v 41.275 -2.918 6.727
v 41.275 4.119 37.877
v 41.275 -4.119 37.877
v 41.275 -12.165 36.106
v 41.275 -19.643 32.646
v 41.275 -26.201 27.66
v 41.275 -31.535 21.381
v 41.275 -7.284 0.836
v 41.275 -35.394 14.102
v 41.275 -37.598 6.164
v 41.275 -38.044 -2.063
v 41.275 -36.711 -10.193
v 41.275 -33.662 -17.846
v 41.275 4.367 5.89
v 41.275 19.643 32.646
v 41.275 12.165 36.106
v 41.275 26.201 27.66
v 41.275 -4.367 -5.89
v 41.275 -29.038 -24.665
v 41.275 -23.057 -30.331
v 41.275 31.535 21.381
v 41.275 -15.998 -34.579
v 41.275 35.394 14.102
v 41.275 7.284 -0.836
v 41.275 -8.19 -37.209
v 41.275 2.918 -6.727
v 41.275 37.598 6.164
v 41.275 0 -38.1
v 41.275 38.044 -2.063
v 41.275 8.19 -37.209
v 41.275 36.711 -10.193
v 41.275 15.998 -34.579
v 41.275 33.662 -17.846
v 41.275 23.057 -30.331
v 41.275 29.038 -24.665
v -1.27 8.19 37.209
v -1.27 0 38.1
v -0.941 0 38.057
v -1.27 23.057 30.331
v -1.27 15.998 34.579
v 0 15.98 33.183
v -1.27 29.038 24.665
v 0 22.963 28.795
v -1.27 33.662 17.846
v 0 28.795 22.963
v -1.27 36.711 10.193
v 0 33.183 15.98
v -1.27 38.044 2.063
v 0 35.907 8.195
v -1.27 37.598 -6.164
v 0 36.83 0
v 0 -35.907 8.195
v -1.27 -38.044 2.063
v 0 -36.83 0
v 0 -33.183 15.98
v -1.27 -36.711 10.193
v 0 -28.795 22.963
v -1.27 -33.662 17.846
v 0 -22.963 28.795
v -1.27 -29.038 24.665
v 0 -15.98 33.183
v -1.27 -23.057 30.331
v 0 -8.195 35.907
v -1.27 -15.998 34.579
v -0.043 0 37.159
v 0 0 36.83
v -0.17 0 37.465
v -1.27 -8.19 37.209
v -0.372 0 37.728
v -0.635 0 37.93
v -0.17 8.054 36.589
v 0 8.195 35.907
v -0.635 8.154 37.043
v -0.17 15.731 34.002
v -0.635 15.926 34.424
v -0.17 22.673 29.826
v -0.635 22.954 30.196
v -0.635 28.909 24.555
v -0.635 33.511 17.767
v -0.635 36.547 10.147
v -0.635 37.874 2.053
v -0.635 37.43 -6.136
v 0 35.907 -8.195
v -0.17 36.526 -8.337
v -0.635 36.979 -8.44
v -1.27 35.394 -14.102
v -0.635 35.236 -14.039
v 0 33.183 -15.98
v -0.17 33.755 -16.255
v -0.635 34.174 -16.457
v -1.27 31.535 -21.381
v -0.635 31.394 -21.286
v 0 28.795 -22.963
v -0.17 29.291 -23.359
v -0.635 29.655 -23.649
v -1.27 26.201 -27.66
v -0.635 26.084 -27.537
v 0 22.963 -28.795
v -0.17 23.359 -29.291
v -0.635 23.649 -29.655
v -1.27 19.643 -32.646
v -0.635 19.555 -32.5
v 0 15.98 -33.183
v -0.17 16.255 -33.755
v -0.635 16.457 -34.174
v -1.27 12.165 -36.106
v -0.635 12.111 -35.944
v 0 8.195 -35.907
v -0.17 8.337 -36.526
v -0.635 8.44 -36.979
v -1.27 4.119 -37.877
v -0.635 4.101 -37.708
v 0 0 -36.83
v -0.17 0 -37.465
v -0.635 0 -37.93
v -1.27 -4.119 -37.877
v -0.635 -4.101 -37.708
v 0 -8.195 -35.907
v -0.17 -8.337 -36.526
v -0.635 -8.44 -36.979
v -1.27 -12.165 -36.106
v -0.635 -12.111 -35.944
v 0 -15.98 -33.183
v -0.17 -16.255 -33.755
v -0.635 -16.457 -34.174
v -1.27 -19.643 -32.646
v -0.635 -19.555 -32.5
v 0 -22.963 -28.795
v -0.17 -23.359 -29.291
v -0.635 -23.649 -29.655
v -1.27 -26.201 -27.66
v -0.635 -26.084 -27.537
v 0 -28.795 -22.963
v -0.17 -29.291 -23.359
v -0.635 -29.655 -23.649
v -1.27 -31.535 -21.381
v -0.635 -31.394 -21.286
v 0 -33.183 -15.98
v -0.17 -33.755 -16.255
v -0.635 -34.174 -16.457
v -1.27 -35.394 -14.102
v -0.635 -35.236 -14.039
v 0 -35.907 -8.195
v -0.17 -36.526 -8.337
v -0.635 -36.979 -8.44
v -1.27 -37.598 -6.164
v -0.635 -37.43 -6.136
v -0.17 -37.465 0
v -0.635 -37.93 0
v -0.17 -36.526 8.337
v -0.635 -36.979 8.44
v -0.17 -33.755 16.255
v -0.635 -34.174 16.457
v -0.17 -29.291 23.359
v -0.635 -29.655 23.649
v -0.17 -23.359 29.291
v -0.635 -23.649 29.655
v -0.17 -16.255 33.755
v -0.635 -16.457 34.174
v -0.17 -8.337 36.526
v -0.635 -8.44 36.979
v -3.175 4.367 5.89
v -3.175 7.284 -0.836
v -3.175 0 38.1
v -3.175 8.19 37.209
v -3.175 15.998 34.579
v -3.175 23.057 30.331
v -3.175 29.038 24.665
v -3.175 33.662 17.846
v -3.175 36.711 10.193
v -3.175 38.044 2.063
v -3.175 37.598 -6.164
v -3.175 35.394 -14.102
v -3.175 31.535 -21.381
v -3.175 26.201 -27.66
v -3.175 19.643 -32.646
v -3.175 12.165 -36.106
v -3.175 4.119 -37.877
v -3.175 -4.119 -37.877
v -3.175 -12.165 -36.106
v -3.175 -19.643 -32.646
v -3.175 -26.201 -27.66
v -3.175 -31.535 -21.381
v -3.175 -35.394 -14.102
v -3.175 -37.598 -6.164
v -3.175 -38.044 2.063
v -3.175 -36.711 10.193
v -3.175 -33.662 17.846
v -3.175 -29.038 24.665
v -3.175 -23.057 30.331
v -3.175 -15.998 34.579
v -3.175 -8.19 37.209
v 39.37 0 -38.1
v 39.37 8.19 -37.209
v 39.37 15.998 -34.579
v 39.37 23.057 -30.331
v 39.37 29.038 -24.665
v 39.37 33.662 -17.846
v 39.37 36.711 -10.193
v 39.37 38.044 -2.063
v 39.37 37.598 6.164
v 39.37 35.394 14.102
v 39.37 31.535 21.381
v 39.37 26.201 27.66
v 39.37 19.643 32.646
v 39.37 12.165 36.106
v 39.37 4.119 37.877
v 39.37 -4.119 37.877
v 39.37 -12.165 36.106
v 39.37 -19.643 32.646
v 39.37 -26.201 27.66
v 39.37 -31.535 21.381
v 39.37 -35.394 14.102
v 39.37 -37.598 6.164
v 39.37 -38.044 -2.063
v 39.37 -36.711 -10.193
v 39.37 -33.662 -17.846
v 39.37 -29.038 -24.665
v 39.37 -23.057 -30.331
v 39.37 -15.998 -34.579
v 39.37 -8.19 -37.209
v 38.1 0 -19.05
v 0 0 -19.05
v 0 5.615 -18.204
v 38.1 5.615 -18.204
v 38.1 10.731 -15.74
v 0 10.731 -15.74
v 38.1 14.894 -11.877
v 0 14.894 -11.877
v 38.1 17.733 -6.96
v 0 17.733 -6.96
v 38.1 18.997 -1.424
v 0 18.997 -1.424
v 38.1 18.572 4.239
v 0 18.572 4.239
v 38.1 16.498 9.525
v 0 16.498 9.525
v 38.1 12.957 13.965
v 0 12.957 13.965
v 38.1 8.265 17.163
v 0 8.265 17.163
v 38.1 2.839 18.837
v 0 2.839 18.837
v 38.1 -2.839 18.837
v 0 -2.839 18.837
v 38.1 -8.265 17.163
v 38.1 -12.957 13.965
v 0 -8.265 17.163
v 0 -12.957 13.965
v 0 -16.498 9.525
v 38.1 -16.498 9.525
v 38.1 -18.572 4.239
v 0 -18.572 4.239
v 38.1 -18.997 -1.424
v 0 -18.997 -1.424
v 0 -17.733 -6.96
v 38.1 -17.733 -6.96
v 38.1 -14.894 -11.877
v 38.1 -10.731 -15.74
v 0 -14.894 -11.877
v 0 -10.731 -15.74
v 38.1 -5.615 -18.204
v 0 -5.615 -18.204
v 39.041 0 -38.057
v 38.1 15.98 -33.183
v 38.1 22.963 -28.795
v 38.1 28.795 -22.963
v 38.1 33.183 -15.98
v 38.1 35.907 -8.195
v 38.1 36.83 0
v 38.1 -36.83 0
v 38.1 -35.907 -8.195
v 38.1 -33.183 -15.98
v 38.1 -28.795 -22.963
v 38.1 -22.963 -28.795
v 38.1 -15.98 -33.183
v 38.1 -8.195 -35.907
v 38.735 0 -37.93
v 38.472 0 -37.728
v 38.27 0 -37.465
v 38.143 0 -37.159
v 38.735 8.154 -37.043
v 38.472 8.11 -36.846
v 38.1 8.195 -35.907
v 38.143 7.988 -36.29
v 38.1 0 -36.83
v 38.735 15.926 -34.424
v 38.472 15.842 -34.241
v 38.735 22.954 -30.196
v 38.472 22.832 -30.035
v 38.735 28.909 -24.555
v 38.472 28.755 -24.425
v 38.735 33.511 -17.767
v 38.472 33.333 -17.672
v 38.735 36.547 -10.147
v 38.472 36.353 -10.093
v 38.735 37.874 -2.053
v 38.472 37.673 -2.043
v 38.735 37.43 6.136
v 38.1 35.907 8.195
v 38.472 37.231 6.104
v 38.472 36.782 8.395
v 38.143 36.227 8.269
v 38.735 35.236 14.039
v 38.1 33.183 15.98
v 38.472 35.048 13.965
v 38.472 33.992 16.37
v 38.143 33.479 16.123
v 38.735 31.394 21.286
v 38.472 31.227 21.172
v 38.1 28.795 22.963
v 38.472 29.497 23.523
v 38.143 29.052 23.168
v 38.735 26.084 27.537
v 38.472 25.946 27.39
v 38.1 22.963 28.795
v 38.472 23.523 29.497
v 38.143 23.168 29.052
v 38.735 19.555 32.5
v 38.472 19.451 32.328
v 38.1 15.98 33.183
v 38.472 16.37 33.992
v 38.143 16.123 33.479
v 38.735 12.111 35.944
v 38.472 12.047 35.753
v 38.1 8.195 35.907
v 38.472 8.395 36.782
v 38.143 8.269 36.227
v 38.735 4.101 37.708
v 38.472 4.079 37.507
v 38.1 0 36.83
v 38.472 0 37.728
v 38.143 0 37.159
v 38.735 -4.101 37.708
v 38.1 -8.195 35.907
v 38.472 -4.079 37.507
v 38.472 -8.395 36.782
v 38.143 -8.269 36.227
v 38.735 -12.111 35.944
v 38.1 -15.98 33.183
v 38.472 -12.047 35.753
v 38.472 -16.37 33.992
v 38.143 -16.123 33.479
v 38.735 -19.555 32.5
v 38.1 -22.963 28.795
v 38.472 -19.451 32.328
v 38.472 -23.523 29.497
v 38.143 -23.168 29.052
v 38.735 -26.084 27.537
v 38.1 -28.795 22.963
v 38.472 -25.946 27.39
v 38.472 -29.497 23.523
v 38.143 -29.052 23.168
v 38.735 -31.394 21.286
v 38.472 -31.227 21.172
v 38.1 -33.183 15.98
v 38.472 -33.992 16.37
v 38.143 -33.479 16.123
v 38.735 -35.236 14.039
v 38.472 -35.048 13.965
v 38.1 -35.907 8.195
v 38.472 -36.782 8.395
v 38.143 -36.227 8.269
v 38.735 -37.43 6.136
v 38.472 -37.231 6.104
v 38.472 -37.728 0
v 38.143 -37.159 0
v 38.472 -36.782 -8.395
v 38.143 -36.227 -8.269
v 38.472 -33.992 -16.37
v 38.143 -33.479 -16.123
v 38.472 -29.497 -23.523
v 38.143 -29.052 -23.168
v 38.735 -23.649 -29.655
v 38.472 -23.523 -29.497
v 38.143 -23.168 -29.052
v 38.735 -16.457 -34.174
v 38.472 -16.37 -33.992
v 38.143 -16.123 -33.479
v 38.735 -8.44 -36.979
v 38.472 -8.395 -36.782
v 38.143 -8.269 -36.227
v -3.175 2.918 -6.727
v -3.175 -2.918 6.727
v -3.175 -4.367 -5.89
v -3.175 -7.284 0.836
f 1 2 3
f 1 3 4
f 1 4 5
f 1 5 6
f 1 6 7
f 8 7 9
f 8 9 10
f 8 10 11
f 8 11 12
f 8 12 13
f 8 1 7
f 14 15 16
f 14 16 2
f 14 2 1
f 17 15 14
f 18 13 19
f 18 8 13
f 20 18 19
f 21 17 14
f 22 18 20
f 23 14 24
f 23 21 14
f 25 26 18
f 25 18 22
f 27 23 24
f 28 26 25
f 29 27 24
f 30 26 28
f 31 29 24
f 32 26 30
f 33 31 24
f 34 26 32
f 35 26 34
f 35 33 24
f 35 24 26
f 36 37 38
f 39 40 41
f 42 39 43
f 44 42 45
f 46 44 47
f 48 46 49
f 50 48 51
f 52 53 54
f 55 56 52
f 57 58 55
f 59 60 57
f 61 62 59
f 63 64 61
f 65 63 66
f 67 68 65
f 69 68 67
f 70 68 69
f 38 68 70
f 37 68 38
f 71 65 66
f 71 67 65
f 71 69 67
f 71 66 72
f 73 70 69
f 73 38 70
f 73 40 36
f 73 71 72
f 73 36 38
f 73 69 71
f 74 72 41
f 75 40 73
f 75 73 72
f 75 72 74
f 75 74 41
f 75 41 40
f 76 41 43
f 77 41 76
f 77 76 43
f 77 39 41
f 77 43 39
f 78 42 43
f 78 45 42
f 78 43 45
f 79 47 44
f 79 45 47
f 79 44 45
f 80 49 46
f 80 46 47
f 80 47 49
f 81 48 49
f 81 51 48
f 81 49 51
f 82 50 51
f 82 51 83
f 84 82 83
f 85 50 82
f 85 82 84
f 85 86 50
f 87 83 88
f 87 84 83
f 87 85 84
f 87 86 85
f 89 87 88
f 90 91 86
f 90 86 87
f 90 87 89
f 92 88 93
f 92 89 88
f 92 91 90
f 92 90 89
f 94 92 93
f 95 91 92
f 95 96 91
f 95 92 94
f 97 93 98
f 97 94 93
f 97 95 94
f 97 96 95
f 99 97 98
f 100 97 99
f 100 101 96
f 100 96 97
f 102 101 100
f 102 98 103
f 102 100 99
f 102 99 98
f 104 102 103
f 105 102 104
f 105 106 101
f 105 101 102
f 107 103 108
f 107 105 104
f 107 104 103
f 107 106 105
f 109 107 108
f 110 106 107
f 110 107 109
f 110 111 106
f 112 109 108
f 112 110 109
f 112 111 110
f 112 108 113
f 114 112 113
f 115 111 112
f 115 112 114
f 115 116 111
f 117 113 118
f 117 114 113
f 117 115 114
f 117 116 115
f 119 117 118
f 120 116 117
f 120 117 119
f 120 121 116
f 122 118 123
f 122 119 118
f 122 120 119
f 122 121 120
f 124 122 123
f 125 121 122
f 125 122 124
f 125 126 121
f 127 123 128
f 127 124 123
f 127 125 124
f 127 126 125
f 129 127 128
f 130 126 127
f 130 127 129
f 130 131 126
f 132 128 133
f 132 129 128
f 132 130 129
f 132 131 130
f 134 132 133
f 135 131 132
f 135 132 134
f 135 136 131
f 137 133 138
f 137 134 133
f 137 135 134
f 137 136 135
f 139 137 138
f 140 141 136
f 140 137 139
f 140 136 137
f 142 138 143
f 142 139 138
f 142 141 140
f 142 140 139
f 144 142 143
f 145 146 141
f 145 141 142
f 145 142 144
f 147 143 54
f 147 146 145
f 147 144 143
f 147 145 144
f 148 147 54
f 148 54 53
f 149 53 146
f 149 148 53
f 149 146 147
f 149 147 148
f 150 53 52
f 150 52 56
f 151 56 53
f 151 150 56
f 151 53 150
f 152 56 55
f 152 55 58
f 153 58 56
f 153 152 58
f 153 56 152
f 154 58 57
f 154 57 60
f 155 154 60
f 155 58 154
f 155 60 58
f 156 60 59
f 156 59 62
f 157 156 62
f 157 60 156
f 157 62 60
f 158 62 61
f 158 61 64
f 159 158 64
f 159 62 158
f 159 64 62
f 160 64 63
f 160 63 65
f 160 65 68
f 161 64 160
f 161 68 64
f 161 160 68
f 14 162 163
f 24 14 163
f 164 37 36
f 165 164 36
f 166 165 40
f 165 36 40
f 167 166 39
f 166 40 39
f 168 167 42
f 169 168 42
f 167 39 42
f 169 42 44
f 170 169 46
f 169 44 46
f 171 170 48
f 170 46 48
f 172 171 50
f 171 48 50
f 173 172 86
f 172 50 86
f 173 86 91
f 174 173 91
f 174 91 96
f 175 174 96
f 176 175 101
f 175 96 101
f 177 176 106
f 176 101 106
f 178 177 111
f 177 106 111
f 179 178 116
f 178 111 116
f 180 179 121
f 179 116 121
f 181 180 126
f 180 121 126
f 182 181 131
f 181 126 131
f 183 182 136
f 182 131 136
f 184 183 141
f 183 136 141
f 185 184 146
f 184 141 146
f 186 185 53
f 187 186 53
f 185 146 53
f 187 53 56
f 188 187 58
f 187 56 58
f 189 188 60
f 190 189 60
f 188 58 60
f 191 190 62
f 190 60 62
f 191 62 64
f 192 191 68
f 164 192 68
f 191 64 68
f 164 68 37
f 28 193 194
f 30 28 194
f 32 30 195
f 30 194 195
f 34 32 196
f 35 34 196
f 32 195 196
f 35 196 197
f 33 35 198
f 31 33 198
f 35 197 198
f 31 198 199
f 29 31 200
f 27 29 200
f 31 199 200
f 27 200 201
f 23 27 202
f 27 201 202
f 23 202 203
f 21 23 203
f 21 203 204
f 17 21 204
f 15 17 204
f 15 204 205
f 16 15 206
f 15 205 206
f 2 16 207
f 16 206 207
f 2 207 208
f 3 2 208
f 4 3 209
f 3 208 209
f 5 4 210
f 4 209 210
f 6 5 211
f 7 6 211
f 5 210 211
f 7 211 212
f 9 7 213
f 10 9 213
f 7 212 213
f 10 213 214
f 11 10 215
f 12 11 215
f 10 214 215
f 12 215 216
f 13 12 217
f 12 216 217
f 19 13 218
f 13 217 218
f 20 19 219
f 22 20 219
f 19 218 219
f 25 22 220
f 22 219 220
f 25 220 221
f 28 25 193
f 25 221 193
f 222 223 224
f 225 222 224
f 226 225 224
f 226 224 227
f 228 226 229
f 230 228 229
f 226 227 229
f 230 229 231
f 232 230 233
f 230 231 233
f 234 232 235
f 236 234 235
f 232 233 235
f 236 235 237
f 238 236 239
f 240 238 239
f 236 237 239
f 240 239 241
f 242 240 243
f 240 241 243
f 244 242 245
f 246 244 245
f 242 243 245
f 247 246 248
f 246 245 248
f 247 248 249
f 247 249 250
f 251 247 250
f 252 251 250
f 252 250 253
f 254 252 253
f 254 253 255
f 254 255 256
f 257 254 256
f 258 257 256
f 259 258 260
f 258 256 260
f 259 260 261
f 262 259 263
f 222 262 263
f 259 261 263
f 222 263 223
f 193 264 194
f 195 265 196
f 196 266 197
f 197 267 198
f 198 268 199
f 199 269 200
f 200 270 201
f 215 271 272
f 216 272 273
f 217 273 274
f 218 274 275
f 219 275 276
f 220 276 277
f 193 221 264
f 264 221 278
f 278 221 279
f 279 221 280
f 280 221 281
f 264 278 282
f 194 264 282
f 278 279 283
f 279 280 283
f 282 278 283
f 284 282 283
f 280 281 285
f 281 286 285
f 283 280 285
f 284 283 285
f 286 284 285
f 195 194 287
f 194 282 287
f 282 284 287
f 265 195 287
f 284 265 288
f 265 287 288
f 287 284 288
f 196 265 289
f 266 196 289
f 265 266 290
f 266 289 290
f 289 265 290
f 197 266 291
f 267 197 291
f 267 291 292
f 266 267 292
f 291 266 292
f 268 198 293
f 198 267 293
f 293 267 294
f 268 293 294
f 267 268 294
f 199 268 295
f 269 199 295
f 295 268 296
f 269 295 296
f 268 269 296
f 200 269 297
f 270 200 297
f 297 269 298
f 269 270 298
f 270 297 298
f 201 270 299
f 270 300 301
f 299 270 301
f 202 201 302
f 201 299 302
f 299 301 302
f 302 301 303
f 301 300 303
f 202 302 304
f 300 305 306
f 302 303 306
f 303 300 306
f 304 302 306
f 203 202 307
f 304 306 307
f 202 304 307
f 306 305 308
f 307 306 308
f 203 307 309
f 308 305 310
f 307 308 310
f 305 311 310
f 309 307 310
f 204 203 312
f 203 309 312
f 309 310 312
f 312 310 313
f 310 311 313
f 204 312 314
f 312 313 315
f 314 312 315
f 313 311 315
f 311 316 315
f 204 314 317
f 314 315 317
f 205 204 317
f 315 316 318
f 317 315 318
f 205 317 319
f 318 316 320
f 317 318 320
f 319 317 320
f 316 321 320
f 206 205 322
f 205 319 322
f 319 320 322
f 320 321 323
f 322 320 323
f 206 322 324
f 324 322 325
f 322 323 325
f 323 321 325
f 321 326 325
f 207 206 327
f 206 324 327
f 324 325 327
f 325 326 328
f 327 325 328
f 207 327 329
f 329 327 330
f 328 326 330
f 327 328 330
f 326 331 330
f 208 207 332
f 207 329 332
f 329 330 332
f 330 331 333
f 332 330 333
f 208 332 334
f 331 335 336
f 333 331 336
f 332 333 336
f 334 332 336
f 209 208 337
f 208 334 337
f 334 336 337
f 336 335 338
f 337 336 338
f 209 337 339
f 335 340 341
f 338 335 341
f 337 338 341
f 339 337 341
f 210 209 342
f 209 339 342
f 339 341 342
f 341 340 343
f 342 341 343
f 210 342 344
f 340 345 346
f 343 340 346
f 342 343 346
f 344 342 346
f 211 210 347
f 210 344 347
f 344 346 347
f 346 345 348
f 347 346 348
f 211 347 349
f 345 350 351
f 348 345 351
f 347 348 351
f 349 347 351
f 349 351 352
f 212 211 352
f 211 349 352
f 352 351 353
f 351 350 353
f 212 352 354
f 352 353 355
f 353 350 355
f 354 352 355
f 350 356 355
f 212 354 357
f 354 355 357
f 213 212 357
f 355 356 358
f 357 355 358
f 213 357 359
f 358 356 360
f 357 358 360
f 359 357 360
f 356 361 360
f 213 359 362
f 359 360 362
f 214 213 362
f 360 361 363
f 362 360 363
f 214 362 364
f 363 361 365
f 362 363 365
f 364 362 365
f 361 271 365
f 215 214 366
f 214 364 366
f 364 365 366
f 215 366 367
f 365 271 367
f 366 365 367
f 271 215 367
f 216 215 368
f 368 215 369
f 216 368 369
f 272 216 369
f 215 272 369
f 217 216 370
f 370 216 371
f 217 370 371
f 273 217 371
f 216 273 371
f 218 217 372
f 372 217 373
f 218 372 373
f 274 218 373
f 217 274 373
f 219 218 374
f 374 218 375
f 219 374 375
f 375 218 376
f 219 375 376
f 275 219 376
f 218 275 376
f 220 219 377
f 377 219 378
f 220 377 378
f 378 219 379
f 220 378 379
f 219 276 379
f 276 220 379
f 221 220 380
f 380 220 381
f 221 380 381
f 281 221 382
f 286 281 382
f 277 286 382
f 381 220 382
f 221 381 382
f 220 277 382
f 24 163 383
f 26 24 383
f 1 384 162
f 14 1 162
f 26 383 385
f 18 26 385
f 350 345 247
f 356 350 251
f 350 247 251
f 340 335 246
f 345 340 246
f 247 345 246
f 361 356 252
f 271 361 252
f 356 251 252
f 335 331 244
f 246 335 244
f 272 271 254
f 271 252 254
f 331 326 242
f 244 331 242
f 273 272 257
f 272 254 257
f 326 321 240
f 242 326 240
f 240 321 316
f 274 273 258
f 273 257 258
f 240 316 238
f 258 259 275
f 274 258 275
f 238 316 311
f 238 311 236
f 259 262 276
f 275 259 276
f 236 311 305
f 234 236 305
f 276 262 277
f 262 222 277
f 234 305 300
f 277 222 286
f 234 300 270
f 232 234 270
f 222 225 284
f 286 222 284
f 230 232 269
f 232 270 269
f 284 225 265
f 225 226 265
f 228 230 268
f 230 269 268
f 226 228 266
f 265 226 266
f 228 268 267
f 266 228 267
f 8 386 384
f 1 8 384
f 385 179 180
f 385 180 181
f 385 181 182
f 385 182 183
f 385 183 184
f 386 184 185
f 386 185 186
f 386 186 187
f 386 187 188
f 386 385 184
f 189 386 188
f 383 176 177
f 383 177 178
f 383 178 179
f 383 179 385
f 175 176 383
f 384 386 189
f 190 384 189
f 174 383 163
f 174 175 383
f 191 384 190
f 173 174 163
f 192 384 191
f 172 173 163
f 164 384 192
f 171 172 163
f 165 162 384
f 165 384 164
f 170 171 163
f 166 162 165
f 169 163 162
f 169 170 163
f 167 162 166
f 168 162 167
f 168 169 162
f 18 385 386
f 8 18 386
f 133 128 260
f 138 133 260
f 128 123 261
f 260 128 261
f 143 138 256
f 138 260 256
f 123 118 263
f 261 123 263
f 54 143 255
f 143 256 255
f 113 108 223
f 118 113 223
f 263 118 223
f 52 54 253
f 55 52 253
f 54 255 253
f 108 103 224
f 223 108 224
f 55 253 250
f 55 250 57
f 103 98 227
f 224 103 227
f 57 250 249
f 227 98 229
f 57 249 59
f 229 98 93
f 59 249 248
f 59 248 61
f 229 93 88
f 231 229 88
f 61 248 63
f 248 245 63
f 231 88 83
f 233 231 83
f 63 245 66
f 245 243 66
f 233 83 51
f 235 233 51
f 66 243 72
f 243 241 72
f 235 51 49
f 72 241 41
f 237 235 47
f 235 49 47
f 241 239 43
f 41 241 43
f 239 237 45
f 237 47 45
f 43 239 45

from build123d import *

# Parameters (mm, degrees)
SKETCH1_R           = 19.05
BOSS_EXTRUDE1_DEPTH = 38.1
SKETCH2_R           = 38.1
BOSS_EXTRUDE2_DEPTH = 3.175
SKETCH3_R           = 38.1
BOSS_EXTRUDE3_DEPTH = 3.175
SKETCH4_R           = 6.35
CUT_EXTRUDE1_DEPTH  = 45.45
FILLET1_R           = 1.27
CUT_EXTRUDE2_DEPTH  = 45.45


with BuildPart() as part:
    # Sketch1 → Boss-Extrude1 (new body)
    with BuildSketch(Plane(origin=(0, 0, 0), x_dir=(0, 0, -1), z_dir=(1, 0, 0))):
        Circle(SKETCH1_R)
    extrude(amount=BOSS_EXTRUDE1_DEPTH)

    # Sketch2 → Boss-Extrude2 (add)
    with BuildSketch(Plane.ZY):
        Circle(SKETCH2_R)
    extrude(amount=BOSS_EXTRUDE2_DEPTH)

    # Sketch3 → Boss-Extrude3 (add)
    with BuildSketch(Plane(origin=(38.1, 0, 0), x_dir=(0, 0, -1), z_dir=(1, 0, 0))):
        Circle(SKETCH3_R)
    extrude(amount=BOSS_EXTRUDE3_DEPTH)

    # Sketch4 → Cut-Extrude1 (cut, through all)
    with BuildSketch(Plane.ZY.offset(3.175)):
        Circle(SKETCH4_R)
    extrude(amount=-CUT_EXTRUDE1_DEPTH, mode=Mode.SUBTRACT)

    # Fillet1
    fillet1_edges = [part.edges().sort_by_distance(p)[0] for p in [
        (0, 0, -38.1),
        (38.1, 0, 38.1),
    ]]
    fillet(fillet1_edges, radius=FILLET1_R)

    # Sketch5 → Cut-Extrude2 (cut, through all)
    with BuildSketch(Plane.ZY.offset(3.175)):
        Polygon((-5.890350999, -4.366588879), (0.836401397, -7.284488042), (6.726752397, -2.917899163), (5.890350999, 4.366588879), (-0.836401397, 7.284488042), (-6.726752397, 2.917899163), align=None)
    extrude(amount=-CUT_EXTRUDE2_DEPTH, mode=Mode.SUBTRACT)


solid = part.part
